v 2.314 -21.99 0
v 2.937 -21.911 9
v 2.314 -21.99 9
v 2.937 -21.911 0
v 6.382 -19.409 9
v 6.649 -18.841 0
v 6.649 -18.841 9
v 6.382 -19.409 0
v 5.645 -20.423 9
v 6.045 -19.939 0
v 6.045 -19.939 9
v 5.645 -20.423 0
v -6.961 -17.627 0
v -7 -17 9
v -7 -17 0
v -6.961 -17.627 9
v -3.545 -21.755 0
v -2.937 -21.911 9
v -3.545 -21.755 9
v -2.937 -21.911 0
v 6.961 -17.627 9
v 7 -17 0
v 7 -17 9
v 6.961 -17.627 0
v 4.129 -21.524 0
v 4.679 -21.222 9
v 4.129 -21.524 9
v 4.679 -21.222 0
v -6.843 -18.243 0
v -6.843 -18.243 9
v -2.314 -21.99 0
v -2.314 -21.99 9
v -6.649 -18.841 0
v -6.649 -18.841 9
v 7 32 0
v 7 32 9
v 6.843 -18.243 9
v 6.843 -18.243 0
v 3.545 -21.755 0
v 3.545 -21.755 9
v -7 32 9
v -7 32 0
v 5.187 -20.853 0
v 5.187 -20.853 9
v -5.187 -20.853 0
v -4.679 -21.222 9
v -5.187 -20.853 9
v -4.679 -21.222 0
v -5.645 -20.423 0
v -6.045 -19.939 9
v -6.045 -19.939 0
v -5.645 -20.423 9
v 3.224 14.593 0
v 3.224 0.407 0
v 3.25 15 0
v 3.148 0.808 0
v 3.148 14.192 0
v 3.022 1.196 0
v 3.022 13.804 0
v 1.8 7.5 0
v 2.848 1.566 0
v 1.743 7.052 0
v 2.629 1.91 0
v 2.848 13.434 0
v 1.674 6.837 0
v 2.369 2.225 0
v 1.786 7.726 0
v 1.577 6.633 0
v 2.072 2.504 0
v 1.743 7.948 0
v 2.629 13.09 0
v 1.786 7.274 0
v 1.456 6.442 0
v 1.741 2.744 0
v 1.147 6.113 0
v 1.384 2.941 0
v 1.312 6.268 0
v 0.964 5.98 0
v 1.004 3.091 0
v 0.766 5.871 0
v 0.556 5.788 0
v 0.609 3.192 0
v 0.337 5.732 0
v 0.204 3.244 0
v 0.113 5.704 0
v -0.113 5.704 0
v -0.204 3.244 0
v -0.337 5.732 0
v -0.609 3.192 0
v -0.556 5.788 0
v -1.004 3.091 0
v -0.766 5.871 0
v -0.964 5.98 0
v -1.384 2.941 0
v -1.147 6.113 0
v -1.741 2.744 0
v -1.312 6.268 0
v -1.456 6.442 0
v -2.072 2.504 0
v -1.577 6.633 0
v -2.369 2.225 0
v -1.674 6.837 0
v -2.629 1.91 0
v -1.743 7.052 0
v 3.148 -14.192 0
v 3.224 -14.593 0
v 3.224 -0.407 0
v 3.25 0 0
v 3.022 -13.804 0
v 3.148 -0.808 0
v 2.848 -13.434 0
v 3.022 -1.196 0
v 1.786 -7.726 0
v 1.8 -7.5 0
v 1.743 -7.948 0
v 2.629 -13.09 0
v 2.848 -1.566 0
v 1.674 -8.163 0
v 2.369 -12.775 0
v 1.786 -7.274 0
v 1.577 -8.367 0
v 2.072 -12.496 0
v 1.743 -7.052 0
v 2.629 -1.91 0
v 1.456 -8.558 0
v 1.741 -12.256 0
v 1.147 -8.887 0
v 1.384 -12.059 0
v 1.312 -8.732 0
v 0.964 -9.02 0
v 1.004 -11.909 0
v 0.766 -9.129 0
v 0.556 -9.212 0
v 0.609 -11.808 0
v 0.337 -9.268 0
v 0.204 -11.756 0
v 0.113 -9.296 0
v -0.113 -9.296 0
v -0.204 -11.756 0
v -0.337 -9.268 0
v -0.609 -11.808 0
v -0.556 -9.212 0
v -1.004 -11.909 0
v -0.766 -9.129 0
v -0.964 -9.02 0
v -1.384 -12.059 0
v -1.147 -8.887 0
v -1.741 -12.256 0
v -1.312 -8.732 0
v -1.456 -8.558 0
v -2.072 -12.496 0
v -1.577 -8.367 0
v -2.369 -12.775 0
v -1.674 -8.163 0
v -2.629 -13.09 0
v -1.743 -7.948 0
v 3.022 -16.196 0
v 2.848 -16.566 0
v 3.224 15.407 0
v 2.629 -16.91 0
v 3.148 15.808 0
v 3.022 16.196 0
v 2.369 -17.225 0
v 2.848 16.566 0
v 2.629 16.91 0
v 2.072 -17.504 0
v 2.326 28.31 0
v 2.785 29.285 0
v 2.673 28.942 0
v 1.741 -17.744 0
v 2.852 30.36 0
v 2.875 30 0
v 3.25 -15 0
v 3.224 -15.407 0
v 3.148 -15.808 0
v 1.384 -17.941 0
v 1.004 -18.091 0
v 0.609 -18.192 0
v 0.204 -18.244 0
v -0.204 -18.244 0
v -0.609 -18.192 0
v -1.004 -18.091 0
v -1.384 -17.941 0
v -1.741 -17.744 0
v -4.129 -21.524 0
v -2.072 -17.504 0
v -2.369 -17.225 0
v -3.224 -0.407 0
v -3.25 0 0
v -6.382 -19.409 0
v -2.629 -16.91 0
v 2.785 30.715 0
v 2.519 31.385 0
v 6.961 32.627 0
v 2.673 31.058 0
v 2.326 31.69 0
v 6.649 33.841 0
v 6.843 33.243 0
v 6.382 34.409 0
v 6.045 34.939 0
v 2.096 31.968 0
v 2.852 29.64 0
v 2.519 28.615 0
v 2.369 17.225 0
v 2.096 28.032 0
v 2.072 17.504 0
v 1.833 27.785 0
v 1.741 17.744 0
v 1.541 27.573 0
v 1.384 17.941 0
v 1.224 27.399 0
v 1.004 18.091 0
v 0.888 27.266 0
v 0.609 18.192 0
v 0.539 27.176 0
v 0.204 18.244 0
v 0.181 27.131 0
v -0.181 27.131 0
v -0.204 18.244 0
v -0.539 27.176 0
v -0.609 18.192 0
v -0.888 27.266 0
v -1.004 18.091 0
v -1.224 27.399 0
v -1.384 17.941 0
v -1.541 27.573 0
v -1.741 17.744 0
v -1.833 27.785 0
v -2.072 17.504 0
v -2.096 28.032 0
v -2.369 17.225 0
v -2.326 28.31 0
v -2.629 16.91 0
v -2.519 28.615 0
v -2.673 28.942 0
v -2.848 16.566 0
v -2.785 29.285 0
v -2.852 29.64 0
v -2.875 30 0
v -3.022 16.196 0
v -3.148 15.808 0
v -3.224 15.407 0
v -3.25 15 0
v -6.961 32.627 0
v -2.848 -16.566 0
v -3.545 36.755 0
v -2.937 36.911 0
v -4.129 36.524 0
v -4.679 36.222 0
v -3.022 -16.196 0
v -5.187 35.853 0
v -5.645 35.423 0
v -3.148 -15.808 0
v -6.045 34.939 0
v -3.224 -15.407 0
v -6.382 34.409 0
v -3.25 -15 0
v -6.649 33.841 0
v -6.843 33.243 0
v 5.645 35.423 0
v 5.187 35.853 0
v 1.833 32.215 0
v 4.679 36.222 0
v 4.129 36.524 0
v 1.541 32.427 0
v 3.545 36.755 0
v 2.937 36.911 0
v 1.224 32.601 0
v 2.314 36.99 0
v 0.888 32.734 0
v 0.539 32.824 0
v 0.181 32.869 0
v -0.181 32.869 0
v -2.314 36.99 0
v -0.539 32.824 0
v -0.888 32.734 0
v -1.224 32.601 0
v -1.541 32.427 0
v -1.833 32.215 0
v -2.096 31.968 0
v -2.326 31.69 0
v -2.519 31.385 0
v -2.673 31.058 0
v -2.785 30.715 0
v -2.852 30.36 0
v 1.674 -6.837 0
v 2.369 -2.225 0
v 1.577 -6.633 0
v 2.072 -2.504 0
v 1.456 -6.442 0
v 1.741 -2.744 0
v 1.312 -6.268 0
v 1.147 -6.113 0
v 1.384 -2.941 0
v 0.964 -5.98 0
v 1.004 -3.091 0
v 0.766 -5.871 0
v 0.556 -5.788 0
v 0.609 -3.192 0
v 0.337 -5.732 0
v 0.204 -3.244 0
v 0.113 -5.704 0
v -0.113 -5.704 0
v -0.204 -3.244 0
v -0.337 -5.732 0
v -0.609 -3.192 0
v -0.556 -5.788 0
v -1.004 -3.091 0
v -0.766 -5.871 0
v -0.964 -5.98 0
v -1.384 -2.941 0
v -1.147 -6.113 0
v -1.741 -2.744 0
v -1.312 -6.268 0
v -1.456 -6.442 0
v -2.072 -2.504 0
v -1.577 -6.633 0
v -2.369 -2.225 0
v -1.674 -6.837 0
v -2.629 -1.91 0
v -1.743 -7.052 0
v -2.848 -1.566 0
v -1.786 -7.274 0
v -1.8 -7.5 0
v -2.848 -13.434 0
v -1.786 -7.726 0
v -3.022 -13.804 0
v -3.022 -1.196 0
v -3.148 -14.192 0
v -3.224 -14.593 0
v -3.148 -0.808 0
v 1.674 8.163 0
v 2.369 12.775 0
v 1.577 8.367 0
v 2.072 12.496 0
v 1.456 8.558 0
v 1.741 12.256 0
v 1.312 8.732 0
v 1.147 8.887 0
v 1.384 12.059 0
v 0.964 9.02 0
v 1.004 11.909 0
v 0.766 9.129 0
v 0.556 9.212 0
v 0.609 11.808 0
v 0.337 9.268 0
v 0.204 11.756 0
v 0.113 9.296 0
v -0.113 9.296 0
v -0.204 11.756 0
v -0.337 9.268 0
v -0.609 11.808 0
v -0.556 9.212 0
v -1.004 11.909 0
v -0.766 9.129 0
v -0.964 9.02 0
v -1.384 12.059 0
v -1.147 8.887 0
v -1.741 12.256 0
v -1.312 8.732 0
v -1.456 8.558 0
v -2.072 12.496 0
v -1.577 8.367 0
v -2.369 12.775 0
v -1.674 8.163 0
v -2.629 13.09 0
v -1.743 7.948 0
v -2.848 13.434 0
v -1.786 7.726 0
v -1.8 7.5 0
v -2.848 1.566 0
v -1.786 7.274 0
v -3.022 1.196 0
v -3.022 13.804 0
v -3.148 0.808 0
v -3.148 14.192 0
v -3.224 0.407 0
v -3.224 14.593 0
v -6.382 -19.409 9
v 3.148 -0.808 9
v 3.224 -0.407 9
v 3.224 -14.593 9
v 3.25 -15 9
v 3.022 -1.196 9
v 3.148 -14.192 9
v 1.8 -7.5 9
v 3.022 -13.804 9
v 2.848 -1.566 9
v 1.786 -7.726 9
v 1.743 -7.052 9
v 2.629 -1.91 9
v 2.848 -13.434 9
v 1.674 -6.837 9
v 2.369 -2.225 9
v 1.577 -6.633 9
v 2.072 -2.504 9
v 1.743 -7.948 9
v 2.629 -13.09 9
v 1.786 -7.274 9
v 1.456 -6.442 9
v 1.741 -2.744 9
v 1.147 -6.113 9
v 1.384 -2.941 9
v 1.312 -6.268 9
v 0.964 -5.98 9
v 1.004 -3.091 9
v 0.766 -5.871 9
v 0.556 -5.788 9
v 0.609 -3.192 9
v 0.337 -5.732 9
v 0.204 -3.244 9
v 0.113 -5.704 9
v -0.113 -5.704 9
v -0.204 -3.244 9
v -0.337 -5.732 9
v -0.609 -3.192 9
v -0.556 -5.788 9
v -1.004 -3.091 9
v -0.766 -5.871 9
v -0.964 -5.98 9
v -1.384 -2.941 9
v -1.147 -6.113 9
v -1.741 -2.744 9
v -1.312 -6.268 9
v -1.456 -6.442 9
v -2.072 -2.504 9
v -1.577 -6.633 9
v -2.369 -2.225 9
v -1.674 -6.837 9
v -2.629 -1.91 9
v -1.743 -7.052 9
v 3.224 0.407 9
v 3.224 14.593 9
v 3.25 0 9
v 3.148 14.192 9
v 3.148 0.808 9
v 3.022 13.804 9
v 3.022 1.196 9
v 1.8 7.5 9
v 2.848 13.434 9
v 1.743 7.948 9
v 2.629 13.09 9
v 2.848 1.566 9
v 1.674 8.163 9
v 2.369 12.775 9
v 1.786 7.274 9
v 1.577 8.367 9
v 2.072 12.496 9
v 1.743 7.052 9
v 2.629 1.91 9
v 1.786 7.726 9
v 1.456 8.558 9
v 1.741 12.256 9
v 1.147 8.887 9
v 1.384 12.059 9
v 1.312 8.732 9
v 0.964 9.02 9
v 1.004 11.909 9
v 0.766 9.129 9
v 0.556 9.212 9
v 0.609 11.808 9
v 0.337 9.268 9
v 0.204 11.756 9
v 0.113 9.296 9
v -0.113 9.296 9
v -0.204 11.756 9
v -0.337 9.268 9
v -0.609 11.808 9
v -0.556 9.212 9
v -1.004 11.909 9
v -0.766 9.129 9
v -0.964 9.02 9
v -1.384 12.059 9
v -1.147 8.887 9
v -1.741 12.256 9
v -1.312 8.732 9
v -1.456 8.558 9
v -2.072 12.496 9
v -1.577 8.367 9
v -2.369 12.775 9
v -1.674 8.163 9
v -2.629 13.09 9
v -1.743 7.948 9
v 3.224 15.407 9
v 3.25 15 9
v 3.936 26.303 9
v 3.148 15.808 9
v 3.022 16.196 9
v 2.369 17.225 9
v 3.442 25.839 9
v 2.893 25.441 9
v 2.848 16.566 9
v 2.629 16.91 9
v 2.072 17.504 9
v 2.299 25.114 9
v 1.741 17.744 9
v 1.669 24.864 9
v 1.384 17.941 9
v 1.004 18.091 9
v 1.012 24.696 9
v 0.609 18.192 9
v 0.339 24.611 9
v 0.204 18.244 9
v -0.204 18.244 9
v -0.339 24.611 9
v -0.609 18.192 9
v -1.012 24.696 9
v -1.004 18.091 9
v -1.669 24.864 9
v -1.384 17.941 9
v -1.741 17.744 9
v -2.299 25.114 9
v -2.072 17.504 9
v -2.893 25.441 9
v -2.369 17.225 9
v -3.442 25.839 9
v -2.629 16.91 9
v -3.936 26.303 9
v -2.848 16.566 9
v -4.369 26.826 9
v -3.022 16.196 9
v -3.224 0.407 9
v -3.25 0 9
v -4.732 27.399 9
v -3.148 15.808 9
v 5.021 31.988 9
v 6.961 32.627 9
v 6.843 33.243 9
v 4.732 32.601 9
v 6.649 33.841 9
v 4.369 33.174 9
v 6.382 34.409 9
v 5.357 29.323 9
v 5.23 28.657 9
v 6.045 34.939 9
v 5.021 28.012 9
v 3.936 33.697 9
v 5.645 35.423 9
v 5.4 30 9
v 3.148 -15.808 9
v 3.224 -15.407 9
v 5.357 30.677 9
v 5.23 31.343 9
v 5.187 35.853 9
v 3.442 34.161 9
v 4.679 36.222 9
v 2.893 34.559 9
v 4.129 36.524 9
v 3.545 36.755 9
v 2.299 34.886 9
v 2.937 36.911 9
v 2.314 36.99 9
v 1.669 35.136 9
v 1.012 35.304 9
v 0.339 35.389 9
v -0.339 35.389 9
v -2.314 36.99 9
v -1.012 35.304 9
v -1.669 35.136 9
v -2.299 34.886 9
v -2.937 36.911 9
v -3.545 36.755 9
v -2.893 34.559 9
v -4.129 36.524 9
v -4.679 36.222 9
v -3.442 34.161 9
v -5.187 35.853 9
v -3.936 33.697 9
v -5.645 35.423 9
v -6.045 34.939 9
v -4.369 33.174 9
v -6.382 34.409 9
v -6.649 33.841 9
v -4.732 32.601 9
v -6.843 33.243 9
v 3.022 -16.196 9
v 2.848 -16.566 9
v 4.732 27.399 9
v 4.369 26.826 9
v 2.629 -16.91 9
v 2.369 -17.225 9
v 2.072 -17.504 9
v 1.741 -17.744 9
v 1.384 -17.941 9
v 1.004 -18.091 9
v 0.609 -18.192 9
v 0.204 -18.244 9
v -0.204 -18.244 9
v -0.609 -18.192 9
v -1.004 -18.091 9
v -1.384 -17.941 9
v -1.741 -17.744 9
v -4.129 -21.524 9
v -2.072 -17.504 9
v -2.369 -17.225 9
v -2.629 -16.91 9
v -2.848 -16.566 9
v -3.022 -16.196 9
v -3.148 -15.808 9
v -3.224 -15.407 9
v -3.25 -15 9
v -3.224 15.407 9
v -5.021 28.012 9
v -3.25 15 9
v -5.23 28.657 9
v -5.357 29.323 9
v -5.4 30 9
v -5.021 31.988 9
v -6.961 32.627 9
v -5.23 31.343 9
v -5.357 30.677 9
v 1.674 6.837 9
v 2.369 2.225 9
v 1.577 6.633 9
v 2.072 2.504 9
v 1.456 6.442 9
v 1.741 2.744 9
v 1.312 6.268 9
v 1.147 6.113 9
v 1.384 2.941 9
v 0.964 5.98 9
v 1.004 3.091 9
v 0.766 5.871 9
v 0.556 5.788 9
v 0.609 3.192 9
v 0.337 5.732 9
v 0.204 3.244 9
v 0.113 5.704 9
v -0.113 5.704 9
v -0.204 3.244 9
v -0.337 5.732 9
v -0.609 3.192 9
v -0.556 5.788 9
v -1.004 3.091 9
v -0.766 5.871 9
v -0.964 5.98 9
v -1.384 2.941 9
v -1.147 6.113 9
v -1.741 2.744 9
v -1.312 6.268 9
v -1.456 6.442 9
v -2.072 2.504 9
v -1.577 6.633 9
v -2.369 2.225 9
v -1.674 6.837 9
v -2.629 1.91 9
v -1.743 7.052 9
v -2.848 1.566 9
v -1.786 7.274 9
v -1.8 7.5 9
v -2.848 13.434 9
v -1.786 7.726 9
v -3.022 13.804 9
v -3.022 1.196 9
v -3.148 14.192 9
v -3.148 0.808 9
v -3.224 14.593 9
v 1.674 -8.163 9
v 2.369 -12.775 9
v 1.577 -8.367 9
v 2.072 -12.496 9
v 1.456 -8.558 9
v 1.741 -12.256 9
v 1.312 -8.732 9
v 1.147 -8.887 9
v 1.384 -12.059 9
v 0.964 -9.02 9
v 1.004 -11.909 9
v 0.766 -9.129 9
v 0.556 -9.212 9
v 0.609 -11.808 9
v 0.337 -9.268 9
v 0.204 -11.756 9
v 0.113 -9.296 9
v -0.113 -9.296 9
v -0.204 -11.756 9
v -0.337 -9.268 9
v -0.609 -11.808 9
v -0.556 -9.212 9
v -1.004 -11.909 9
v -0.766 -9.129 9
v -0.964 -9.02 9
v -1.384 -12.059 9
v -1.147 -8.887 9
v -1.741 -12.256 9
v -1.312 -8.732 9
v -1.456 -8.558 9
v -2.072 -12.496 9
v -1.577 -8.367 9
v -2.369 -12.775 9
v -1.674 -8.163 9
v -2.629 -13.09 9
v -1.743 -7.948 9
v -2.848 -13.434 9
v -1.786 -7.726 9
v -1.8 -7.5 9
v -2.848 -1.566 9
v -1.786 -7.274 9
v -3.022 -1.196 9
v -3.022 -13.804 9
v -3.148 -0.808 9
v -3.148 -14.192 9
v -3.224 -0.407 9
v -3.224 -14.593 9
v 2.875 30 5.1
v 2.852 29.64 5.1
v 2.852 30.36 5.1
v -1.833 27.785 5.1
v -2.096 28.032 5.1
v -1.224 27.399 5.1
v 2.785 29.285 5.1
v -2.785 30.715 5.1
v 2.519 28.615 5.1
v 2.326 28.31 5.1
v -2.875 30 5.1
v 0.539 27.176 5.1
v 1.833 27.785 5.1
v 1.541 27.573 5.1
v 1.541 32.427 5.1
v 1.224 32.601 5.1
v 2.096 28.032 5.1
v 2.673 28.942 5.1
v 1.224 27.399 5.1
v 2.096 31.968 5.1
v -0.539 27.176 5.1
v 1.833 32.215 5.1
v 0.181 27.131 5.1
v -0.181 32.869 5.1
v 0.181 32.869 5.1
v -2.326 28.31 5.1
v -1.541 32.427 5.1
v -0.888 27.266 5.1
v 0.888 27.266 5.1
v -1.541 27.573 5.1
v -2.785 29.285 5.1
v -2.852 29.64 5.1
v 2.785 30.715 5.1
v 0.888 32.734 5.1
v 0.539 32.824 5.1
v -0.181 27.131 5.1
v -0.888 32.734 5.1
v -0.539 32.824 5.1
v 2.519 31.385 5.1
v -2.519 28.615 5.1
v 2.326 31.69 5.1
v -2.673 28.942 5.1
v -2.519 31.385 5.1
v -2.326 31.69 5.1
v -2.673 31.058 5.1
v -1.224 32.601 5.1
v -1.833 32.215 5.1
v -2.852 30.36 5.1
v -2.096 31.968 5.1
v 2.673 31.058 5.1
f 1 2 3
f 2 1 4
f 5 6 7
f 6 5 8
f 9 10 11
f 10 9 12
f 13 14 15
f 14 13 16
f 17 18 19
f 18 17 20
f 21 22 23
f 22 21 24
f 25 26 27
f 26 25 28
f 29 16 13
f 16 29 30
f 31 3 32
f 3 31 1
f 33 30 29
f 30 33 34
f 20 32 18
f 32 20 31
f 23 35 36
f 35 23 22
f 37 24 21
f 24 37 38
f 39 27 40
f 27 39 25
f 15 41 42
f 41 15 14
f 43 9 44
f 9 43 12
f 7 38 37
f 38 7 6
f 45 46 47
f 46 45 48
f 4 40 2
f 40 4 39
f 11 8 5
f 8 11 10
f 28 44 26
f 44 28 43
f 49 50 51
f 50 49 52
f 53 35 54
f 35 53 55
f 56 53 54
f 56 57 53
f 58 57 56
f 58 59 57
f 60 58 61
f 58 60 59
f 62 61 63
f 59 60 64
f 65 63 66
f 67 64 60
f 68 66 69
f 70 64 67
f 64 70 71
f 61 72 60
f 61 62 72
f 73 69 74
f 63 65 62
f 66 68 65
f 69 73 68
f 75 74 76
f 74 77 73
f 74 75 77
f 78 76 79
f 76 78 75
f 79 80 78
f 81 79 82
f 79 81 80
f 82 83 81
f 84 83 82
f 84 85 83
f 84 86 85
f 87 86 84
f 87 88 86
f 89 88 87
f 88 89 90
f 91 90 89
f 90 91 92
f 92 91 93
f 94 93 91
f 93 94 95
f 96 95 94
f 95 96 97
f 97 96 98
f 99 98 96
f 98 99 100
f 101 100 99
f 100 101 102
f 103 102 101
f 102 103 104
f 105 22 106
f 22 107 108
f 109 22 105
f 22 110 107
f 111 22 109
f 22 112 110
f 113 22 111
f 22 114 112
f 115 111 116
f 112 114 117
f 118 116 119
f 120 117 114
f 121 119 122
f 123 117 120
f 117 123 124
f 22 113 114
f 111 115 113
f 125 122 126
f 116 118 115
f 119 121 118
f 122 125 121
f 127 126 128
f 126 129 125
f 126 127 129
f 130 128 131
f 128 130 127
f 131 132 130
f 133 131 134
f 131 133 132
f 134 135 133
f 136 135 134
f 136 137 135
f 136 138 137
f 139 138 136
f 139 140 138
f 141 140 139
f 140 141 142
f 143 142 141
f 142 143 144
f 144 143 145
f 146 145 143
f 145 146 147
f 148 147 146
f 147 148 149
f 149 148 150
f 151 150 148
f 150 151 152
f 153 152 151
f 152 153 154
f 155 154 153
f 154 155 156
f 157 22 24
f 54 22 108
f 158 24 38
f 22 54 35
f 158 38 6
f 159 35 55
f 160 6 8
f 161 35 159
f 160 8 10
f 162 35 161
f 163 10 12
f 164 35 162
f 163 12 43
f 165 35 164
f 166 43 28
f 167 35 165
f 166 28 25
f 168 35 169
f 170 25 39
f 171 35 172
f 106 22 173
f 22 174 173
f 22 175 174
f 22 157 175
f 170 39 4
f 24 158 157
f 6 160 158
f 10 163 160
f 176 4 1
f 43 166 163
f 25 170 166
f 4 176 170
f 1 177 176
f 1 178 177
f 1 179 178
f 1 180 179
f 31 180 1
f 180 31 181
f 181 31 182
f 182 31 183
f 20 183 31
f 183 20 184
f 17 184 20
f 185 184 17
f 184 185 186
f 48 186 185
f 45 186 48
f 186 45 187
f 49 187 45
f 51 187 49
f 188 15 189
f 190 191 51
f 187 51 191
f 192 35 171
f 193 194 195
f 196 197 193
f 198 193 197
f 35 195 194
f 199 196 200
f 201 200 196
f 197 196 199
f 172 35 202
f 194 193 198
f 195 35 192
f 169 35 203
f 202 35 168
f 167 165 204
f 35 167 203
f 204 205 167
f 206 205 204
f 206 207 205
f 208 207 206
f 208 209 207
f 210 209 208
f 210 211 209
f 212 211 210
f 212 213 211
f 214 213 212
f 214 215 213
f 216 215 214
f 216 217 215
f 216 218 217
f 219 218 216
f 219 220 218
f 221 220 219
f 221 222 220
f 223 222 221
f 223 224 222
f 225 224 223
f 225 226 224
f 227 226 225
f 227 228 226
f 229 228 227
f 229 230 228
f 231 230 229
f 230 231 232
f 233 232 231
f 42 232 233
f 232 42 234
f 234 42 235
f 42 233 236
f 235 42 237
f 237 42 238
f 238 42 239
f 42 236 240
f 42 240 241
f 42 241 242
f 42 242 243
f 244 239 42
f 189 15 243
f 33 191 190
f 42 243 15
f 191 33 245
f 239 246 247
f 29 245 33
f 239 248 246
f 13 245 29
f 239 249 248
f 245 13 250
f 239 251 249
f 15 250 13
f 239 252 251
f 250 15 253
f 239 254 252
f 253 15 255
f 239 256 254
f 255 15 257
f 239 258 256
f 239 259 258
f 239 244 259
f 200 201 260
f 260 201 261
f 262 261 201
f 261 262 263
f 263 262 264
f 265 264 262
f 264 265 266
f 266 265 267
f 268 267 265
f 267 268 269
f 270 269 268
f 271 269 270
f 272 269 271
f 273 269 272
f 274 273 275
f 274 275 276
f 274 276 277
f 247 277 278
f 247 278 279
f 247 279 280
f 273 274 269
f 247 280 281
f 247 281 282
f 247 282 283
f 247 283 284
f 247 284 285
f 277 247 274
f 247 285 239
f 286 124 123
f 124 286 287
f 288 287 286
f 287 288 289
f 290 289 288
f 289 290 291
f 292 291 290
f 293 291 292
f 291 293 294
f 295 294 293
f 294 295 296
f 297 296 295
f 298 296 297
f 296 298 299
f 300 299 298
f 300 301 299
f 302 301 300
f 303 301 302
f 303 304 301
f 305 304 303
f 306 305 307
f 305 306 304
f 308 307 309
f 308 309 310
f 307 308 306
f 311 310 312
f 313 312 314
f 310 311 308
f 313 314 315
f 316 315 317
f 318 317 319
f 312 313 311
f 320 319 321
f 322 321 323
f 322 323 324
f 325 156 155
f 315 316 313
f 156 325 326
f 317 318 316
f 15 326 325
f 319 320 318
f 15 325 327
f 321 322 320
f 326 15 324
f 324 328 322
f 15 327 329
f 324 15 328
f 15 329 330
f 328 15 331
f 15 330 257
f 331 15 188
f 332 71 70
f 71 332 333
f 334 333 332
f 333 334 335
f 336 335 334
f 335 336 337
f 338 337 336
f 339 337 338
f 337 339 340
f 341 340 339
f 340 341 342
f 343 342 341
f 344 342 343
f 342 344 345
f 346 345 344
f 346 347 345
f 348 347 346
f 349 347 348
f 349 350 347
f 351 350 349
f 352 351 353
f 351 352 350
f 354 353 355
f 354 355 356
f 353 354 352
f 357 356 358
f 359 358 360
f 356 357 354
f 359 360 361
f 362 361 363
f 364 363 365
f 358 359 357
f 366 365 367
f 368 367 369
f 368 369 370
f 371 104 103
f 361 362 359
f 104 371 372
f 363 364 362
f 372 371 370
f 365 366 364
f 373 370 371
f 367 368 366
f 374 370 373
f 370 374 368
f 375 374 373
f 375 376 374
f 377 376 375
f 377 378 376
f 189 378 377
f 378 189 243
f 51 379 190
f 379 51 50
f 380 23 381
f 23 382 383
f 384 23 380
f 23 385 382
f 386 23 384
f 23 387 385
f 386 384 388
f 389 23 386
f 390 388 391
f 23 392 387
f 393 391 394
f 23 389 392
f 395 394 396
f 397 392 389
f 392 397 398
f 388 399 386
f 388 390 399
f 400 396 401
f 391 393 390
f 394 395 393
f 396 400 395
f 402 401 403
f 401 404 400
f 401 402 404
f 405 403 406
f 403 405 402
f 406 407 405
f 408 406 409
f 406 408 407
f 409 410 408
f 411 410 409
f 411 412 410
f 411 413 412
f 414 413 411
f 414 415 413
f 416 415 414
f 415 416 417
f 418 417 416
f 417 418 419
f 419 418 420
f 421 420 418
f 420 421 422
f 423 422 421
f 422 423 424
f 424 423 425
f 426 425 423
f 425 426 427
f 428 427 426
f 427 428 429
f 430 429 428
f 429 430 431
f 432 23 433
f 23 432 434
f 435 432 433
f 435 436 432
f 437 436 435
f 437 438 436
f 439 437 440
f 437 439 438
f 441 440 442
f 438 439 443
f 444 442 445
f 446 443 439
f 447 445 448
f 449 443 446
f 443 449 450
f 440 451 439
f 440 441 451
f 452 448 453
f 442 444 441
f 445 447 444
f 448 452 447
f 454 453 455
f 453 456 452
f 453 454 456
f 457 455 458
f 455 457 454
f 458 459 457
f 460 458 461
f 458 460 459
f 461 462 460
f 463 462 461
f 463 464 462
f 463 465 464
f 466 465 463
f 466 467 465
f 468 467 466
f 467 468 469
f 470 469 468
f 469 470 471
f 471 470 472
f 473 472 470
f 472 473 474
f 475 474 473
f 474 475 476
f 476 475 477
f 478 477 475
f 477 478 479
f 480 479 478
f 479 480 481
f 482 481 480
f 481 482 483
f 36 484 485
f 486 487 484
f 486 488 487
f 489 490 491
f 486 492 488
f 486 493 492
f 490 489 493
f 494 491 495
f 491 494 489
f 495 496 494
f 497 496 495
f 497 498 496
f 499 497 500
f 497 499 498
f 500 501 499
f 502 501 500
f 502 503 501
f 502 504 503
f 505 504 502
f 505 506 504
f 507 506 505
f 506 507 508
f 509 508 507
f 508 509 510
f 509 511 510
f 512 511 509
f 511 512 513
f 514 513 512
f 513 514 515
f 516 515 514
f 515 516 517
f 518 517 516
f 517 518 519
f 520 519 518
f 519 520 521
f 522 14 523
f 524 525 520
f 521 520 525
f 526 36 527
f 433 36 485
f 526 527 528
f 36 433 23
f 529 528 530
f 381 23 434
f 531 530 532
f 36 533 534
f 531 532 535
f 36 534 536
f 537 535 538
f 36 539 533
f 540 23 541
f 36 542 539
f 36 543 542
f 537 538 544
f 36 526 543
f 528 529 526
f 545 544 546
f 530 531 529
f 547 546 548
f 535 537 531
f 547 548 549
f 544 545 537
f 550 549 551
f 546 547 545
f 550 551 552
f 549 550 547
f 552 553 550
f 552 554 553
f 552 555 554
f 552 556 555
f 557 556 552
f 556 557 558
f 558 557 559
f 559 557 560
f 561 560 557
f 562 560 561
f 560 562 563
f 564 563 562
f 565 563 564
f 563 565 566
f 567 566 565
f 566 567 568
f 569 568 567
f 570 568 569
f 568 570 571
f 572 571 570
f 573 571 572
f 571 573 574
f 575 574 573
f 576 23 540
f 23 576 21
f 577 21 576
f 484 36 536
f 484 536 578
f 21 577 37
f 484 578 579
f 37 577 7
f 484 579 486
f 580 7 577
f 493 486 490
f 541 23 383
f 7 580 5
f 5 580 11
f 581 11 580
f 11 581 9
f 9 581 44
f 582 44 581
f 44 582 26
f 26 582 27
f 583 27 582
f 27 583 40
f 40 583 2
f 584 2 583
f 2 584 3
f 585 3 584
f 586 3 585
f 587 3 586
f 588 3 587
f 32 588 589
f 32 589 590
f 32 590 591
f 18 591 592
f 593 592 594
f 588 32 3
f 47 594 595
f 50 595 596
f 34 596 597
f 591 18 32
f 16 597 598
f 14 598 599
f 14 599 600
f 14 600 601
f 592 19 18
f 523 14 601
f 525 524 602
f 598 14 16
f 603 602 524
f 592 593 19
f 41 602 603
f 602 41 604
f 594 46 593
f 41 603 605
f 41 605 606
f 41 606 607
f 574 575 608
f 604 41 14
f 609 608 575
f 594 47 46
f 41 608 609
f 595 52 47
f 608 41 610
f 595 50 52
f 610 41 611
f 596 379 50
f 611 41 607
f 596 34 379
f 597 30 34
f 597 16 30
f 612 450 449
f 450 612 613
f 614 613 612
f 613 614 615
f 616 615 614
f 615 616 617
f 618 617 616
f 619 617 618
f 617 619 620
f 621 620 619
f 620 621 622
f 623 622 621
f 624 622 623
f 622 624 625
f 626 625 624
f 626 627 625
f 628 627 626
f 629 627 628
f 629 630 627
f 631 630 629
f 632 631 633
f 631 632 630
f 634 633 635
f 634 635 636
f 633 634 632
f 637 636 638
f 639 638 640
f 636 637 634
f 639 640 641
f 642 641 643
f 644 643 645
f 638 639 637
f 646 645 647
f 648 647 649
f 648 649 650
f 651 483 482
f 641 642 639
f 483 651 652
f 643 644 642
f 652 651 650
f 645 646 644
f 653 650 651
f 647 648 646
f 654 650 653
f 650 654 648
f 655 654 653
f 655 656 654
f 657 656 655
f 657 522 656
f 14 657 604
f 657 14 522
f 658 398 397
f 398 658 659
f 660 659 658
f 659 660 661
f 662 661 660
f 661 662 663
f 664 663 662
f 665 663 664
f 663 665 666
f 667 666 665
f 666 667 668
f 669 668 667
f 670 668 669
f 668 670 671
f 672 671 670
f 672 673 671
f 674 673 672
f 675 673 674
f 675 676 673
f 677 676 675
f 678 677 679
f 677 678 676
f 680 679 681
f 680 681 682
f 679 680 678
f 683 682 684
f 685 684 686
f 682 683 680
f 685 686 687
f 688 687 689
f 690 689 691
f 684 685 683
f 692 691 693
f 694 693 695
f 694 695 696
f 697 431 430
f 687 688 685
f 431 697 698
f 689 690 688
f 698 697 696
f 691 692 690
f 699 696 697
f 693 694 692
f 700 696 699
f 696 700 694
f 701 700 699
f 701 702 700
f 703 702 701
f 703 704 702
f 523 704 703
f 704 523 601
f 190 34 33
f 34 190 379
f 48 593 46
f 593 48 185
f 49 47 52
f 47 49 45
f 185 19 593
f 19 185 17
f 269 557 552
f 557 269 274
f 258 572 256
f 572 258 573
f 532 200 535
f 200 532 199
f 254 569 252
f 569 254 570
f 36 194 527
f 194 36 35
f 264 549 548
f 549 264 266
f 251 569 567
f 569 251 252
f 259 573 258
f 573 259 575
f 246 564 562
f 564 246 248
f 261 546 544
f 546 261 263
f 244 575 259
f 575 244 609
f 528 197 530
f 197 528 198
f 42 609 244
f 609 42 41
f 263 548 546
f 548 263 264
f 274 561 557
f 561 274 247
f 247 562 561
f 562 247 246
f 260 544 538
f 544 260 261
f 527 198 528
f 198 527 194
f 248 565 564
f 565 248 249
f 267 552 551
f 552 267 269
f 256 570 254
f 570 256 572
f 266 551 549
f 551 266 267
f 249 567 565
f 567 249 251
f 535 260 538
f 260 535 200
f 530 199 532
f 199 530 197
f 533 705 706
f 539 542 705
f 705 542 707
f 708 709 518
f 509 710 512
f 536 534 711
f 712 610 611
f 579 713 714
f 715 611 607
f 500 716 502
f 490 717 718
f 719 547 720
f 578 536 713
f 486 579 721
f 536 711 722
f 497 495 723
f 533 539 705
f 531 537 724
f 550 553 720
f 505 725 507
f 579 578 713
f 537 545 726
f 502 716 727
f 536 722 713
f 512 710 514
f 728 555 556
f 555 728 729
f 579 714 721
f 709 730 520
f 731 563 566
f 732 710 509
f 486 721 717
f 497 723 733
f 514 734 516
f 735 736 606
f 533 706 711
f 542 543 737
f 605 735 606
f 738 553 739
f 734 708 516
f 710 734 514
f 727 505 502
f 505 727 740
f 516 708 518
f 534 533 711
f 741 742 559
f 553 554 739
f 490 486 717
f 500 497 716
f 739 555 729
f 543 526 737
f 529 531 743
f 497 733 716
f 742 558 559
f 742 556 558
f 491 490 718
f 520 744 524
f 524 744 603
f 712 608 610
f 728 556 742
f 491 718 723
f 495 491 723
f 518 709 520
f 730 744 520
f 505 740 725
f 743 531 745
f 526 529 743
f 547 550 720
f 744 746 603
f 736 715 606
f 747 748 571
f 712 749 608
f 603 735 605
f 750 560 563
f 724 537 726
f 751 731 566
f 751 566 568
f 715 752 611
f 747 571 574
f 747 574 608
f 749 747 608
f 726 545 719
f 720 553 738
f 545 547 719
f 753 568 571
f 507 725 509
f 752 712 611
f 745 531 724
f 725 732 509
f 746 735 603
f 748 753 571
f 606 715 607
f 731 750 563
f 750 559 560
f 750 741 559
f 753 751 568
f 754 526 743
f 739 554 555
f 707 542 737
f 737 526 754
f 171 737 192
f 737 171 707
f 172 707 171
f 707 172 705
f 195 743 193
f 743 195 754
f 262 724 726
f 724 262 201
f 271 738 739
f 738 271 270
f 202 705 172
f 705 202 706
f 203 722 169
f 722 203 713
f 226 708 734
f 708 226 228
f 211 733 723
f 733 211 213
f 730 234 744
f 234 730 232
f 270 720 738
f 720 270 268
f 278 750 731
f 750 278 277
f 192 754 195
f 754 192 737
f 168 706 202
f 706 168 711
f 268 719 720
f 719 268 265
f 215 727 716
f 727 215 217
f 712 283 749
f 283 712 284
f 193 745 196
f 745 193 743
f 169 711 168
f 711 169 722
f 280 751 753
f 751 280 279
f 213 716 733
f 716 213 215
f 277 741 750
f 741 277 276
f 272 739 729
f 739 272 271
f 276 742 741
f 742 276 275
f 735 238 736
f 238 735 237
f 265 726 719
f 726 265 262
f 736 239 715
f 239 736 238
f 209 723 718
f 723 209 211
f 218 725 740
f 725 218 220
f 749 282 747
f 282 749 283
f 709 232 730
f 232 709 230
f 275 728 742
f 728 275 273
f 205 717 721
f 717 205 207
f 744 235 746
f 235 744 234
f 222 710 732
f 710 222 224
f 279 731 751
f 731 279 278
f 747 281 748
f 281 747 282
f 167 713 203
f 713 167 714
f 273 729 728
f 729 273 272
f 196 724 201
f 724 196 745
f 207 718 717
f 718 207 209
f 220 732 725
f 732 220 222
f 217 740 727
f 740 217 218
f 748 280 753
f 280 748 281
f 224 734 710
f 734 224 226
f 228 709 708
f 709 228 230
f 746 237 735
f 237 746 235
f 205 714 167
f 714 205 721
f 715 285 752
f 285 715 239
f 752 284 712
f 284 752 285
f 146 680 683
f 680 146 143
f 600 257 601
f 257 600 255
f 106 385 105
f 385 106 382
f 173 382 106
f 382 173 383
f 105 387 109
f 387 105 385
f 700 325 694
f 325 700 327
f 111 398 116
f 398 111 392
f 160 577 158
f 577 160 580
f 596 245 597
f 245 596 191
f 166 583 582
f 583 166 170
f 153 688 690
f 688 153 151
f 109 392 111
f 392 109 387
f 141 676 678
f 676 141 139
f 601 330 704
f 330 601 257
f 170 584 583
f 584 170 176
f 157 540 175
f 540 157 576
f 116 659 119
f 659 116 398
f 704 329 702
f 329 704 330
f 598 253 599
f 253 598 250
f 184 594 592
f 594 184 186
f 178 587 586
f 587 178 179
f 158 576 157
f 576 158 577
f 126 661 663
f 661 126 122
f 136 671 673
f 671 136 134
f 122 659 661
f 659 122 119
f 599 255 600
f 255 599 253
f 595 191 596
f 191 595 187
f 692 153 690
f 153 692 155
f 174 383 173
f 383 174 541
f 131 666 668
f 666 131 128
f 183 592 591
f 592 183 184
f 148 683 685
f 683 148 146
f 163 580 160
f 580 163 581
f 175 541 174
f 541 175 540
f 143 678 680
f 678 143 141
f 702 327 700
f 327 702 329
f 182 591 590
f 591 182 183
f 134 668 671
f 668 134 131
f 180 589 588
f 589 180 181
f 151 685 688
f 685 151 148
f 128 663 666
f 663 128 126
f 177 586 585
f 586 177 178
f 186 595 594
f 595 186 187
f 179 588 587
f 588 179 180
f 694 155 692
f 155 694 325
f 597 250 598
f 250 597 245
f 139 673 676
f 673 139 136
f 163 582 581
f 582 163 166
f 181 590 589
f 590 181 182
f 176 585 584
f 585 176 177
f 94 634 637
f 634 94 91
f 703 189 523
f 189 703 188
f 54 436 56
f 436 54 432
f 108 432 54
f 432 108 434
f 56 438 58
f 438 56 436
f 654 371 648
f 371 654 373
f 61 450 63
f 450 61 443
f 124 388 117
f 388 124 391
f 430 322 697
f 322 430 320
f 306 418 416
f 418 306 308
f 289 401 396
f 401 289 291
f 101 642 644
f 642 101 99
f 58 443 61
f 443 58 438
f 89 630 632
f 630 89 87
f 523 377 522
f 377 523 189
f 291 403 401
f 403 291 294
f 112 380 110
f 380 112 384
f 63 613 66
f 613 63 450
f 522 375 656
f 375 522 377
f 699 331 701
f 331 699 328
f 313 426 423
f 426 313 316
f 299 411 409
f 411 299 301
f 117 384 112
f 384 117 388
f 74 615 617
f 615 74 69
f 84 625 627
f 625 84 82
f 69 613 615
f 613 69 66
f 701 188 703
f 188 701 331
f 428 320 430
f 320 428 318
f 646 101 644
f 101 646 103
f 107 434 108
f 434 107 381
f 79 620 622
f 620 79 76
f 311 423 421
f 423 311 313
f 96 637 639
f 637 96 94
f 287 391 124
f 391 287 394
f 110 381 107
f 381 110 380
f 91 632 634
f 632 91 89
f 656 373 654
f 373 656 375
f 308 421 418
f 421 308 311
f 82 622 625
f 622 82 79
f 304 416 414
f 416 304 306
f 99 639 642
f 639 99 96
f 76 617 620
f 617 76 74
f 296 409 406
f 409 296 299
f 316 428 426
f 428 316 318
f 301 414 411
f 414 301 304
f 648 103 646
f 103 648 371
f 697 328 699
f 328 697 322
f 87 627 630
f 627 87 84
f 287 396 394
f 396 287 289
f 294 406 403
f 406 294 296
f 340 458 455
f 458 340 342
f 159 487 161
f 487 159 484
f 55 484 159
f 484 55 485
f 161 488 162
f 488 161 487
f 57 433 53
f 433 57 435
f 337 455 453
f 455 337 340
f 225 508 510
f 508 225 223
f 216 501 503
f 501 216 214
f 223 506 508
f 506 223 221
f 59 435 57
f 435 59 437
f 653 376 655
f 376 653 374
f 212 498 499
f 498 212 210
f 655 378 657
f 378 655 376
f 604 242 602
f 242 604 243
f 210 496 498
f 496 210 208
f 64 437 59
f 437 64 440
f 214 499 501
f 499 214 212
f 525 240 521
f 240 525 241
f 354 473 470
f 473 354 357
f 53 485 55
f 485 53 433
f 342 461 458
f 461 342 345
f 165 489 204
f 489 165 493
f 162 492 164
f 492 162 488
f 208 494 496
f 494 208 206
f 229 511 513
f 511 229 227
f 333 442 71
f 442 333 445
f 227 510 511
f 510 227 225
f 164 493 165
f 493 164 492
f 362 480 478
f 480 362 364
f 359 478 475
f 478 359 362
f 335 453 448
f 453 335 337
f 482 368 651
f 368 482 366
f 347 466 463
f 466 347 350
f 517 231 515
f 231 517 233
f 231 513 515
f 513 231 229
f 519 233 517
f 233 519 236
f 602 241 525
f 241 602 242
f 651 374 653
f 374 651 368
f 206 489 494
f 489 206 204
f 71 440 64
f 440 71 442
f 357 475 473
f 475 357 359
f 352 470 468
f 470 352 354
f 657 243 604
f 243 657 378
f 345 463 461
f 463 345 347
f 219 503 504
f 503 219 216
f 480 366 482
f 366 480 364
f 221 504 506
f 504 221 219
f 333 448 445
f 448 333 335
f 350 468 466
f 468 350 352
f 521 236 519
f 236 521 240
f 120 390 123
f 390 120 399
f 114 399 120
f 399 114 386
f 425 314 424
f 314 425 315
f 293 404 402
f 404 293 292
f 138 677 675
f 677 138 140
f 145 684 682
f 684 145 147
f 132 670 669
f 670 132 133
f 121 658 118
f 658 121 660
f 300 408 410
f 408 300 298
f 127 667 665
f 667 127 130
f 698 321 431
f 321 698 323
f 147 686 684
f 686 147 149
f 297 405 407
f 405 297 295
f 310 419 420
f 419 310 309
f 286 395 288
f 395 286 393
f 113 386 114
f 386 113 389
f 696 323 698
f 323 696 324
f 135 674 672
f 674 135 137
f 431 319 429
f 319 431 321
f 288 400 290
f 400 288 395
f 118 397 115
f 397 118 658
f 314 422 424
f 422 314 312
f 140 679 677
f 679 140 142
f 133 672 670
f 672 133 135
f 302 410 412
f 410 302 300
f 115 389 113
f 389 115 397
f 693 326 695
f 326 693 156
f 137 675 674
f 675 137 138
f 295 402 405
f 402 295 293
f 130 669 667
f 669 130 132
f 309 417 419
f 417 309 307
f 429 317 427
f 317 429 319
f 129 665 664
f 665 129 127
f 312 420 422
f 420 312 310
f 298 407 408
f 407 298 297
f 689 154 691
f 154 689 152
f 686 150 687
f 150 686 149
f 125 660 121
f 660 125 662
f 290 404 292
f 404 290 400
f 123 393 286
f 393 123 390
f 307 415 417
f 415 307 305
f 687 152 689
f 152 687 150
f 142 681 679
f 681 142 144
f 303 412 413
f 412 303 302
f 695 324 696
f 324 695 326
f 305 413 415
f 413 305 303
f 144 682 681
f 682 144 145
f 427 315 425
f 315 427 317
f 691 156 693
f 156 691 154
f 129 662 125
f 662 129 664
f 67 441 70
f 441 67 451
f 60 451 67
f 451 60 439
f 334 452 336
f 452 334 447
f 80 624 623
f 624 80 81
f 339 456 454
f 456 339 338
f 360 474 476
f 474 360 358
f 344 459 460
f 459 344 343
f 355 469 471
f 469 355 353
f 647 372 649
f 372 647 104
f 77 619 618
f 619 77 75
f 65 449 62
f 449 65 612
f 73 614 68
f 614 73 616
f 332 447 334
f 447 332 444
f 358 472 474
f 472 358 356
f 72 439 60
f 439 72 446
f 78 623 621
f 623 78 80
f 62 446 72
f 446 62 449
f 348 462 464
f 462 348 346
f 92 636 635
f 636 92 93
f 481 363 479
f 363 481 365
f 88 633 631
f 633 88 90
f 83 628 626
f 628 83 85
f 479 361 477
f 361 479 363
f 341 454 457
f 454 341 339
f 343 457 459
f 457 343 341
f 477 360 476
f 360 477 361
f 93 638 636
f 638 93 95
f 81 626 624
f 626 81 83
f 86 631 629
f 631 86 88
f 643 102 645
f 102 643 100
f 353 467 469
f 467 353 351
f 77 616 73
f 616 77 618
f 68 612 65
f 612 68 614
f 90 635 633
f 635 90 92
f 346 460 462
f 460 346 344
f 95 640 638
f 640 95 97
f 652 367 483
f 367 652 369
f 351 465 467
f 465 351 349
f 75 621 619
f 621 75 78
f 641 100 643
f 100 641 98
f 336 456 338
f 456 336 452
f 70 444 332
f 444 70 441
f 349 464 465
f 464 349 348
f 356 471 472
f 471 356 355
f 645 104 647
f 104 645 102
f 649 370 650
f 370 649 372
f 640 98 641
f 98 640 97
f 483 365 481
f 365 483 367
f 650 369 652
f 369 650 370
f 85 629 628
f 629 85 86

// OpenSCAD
$fn = 50;


difference() {
	union() {
		hull() {
			translate(v = [-2.0000000000, 17.0000000000, 0]) {
				cylinder(h = 9, r = 5);
			}
			translate(v = [2.0000000000, 17.0000000000, 0]) {
				cylinder(h = 9, r = 5);
			}
			translate(v = [-2.0000000000, -17.0000000000, 0]) {
				cylinder(h = 9, r = 5);
			}
			translate(v = [2.0000000000, -17.0000000000, 0]) {
				cylinder(h = 9, r = 5);
			}
		}
		translate(v = [0.0000000000, 22.5000000000, 0]) {
			hull() {
				translate(v = [-2.0000000000, 9.5000000000, 0]) {
					cylinder(h = 9, r = 5);
				}
				translate(v = [2.0000000000, 9.5000000000, 0]) {
					cylinder(h = 9, r = 5);
				}
				translate(v = [-2.0000000000, -9.5000000000, 0]) {
					cylinder(h = 9, r = 5);
				}
				translate(v = [2.0000000000, -9.5000000000, 0]) {
					cylinder(h = 9, r = 5);
				}
			}
		}
		translate(v = [0.0000000000, 22.5000000000, 0]) {
			hull() {
				translate(v = [-2.0000000000, 9.5000000000, 0]) {
					cylinder(h = 9, r = 5);
				}
				translate(v = [2.0000000000, 9.5000000000, 0]) {
					cylinder(h = 9, r = 5);
				}
				translate(v = [-2.0000000000, -9.5000000000, 0]) {
					cylinder(h = 9, r = 5);
				}
				translate(v = [2.0000000000, -9.5000000000, 0]) {
					cylinder(h = 9, r = 5);
				}
			}
		}
	}
	union() {
		translate(v = [0.0000000000, 30.0000000000, 9]) {
			rotate(a = [0, 0, 0]) {
				difference() {
					union() {
						#translate(v = [0, 0, -9.0000000000]) {
							cylinder(h = 9, r = 2.6000000000);
						}
						#translate(v = [0, 0, -3.9000000000]) {
							cylinder(h = 3.9000000000, r1 = 2.8750000000, r2 = 5.4000000000);
						}
						#translate(v = [0, 0, -9.0000000000]) {
							cylinder(h = 9, r = 2.8750000000);
						}
						#translate(v = [0, 0, -9.0000000000]) {
							cylinder(h = 9, r = 2.6000000000);
						}
					}
					union();
				}
			}
		}
		translate(v = [0.0000000000, 30.0000000000, 9]) {
			rotate(a = [0, 0, 0]) {
				difference() {
					union() {
						#translate(v = [0, 0, -9.0000000000]) {
							cylinder(h = 9, r = 2.6000000000);
						}
						#translate(v = [0, 0, -3.9000000000]) {
							cylinder(h = 3.9000000000, r1 = 2.8750000000, r2 = 5.4000000000);
						}
						#translate(v = [0, 0, -9.0000000000]) {
							cylinder(h = 9, r = 2.8750000000);
						}
						#translate(v = [0, 0, -9.0000000000]) {
							cylinder(h = 9, r = 2.6000000000);
						}
					}
					union();
				}
			}
		}
		translate(v = [0.0000000000, -15.0000000000, 0]) {
			translate(v = [0, 0, -100]) {
				cylinder(h = 200, r = 3.2500000000);
			}
		}
		translate(v = [0, 0, -100]) {
			cylinder(h = 200, r = 3.2500000000);
		}
		translate(v = [0.0000000000, 15.0000000000, 0]) {
			translate(v = [0, 0, -100]) {
				cylinder(h = 200, r = 3.2500000000);
			}
		}
		translate(v = [0.0000000000, -15.0000000000, 0]) {
			translate(v = [0, 0, -100]) {
				cylinder(h = 200, r = 1.8000000000);
			}
		}
		translate(v = [0.0000000000, -7.5000000000, 0]) {
			translate(v = [0, 0, -100]) {
				cylinder(h = 200, r = 1.8000000000);
			}
		}
		translate(v = [0, 0, -100]) {
			cylinder(h = 200, r = 1.8000000000);
		}
		translate(v = [0.0000000000, 7.5000000000, 0]) {
			translate(v = [0, 0, -100]) {
				cylinder(h = 200, r = 1.8000000000);
			}
		}
		translate(v = [0.0000000000, 15.0000000000, 0]) {
			translate(v = [0, 0, -100]) {
				cylinder(h = 200, r = 1.8000000000);
			}
		}
	}
}
